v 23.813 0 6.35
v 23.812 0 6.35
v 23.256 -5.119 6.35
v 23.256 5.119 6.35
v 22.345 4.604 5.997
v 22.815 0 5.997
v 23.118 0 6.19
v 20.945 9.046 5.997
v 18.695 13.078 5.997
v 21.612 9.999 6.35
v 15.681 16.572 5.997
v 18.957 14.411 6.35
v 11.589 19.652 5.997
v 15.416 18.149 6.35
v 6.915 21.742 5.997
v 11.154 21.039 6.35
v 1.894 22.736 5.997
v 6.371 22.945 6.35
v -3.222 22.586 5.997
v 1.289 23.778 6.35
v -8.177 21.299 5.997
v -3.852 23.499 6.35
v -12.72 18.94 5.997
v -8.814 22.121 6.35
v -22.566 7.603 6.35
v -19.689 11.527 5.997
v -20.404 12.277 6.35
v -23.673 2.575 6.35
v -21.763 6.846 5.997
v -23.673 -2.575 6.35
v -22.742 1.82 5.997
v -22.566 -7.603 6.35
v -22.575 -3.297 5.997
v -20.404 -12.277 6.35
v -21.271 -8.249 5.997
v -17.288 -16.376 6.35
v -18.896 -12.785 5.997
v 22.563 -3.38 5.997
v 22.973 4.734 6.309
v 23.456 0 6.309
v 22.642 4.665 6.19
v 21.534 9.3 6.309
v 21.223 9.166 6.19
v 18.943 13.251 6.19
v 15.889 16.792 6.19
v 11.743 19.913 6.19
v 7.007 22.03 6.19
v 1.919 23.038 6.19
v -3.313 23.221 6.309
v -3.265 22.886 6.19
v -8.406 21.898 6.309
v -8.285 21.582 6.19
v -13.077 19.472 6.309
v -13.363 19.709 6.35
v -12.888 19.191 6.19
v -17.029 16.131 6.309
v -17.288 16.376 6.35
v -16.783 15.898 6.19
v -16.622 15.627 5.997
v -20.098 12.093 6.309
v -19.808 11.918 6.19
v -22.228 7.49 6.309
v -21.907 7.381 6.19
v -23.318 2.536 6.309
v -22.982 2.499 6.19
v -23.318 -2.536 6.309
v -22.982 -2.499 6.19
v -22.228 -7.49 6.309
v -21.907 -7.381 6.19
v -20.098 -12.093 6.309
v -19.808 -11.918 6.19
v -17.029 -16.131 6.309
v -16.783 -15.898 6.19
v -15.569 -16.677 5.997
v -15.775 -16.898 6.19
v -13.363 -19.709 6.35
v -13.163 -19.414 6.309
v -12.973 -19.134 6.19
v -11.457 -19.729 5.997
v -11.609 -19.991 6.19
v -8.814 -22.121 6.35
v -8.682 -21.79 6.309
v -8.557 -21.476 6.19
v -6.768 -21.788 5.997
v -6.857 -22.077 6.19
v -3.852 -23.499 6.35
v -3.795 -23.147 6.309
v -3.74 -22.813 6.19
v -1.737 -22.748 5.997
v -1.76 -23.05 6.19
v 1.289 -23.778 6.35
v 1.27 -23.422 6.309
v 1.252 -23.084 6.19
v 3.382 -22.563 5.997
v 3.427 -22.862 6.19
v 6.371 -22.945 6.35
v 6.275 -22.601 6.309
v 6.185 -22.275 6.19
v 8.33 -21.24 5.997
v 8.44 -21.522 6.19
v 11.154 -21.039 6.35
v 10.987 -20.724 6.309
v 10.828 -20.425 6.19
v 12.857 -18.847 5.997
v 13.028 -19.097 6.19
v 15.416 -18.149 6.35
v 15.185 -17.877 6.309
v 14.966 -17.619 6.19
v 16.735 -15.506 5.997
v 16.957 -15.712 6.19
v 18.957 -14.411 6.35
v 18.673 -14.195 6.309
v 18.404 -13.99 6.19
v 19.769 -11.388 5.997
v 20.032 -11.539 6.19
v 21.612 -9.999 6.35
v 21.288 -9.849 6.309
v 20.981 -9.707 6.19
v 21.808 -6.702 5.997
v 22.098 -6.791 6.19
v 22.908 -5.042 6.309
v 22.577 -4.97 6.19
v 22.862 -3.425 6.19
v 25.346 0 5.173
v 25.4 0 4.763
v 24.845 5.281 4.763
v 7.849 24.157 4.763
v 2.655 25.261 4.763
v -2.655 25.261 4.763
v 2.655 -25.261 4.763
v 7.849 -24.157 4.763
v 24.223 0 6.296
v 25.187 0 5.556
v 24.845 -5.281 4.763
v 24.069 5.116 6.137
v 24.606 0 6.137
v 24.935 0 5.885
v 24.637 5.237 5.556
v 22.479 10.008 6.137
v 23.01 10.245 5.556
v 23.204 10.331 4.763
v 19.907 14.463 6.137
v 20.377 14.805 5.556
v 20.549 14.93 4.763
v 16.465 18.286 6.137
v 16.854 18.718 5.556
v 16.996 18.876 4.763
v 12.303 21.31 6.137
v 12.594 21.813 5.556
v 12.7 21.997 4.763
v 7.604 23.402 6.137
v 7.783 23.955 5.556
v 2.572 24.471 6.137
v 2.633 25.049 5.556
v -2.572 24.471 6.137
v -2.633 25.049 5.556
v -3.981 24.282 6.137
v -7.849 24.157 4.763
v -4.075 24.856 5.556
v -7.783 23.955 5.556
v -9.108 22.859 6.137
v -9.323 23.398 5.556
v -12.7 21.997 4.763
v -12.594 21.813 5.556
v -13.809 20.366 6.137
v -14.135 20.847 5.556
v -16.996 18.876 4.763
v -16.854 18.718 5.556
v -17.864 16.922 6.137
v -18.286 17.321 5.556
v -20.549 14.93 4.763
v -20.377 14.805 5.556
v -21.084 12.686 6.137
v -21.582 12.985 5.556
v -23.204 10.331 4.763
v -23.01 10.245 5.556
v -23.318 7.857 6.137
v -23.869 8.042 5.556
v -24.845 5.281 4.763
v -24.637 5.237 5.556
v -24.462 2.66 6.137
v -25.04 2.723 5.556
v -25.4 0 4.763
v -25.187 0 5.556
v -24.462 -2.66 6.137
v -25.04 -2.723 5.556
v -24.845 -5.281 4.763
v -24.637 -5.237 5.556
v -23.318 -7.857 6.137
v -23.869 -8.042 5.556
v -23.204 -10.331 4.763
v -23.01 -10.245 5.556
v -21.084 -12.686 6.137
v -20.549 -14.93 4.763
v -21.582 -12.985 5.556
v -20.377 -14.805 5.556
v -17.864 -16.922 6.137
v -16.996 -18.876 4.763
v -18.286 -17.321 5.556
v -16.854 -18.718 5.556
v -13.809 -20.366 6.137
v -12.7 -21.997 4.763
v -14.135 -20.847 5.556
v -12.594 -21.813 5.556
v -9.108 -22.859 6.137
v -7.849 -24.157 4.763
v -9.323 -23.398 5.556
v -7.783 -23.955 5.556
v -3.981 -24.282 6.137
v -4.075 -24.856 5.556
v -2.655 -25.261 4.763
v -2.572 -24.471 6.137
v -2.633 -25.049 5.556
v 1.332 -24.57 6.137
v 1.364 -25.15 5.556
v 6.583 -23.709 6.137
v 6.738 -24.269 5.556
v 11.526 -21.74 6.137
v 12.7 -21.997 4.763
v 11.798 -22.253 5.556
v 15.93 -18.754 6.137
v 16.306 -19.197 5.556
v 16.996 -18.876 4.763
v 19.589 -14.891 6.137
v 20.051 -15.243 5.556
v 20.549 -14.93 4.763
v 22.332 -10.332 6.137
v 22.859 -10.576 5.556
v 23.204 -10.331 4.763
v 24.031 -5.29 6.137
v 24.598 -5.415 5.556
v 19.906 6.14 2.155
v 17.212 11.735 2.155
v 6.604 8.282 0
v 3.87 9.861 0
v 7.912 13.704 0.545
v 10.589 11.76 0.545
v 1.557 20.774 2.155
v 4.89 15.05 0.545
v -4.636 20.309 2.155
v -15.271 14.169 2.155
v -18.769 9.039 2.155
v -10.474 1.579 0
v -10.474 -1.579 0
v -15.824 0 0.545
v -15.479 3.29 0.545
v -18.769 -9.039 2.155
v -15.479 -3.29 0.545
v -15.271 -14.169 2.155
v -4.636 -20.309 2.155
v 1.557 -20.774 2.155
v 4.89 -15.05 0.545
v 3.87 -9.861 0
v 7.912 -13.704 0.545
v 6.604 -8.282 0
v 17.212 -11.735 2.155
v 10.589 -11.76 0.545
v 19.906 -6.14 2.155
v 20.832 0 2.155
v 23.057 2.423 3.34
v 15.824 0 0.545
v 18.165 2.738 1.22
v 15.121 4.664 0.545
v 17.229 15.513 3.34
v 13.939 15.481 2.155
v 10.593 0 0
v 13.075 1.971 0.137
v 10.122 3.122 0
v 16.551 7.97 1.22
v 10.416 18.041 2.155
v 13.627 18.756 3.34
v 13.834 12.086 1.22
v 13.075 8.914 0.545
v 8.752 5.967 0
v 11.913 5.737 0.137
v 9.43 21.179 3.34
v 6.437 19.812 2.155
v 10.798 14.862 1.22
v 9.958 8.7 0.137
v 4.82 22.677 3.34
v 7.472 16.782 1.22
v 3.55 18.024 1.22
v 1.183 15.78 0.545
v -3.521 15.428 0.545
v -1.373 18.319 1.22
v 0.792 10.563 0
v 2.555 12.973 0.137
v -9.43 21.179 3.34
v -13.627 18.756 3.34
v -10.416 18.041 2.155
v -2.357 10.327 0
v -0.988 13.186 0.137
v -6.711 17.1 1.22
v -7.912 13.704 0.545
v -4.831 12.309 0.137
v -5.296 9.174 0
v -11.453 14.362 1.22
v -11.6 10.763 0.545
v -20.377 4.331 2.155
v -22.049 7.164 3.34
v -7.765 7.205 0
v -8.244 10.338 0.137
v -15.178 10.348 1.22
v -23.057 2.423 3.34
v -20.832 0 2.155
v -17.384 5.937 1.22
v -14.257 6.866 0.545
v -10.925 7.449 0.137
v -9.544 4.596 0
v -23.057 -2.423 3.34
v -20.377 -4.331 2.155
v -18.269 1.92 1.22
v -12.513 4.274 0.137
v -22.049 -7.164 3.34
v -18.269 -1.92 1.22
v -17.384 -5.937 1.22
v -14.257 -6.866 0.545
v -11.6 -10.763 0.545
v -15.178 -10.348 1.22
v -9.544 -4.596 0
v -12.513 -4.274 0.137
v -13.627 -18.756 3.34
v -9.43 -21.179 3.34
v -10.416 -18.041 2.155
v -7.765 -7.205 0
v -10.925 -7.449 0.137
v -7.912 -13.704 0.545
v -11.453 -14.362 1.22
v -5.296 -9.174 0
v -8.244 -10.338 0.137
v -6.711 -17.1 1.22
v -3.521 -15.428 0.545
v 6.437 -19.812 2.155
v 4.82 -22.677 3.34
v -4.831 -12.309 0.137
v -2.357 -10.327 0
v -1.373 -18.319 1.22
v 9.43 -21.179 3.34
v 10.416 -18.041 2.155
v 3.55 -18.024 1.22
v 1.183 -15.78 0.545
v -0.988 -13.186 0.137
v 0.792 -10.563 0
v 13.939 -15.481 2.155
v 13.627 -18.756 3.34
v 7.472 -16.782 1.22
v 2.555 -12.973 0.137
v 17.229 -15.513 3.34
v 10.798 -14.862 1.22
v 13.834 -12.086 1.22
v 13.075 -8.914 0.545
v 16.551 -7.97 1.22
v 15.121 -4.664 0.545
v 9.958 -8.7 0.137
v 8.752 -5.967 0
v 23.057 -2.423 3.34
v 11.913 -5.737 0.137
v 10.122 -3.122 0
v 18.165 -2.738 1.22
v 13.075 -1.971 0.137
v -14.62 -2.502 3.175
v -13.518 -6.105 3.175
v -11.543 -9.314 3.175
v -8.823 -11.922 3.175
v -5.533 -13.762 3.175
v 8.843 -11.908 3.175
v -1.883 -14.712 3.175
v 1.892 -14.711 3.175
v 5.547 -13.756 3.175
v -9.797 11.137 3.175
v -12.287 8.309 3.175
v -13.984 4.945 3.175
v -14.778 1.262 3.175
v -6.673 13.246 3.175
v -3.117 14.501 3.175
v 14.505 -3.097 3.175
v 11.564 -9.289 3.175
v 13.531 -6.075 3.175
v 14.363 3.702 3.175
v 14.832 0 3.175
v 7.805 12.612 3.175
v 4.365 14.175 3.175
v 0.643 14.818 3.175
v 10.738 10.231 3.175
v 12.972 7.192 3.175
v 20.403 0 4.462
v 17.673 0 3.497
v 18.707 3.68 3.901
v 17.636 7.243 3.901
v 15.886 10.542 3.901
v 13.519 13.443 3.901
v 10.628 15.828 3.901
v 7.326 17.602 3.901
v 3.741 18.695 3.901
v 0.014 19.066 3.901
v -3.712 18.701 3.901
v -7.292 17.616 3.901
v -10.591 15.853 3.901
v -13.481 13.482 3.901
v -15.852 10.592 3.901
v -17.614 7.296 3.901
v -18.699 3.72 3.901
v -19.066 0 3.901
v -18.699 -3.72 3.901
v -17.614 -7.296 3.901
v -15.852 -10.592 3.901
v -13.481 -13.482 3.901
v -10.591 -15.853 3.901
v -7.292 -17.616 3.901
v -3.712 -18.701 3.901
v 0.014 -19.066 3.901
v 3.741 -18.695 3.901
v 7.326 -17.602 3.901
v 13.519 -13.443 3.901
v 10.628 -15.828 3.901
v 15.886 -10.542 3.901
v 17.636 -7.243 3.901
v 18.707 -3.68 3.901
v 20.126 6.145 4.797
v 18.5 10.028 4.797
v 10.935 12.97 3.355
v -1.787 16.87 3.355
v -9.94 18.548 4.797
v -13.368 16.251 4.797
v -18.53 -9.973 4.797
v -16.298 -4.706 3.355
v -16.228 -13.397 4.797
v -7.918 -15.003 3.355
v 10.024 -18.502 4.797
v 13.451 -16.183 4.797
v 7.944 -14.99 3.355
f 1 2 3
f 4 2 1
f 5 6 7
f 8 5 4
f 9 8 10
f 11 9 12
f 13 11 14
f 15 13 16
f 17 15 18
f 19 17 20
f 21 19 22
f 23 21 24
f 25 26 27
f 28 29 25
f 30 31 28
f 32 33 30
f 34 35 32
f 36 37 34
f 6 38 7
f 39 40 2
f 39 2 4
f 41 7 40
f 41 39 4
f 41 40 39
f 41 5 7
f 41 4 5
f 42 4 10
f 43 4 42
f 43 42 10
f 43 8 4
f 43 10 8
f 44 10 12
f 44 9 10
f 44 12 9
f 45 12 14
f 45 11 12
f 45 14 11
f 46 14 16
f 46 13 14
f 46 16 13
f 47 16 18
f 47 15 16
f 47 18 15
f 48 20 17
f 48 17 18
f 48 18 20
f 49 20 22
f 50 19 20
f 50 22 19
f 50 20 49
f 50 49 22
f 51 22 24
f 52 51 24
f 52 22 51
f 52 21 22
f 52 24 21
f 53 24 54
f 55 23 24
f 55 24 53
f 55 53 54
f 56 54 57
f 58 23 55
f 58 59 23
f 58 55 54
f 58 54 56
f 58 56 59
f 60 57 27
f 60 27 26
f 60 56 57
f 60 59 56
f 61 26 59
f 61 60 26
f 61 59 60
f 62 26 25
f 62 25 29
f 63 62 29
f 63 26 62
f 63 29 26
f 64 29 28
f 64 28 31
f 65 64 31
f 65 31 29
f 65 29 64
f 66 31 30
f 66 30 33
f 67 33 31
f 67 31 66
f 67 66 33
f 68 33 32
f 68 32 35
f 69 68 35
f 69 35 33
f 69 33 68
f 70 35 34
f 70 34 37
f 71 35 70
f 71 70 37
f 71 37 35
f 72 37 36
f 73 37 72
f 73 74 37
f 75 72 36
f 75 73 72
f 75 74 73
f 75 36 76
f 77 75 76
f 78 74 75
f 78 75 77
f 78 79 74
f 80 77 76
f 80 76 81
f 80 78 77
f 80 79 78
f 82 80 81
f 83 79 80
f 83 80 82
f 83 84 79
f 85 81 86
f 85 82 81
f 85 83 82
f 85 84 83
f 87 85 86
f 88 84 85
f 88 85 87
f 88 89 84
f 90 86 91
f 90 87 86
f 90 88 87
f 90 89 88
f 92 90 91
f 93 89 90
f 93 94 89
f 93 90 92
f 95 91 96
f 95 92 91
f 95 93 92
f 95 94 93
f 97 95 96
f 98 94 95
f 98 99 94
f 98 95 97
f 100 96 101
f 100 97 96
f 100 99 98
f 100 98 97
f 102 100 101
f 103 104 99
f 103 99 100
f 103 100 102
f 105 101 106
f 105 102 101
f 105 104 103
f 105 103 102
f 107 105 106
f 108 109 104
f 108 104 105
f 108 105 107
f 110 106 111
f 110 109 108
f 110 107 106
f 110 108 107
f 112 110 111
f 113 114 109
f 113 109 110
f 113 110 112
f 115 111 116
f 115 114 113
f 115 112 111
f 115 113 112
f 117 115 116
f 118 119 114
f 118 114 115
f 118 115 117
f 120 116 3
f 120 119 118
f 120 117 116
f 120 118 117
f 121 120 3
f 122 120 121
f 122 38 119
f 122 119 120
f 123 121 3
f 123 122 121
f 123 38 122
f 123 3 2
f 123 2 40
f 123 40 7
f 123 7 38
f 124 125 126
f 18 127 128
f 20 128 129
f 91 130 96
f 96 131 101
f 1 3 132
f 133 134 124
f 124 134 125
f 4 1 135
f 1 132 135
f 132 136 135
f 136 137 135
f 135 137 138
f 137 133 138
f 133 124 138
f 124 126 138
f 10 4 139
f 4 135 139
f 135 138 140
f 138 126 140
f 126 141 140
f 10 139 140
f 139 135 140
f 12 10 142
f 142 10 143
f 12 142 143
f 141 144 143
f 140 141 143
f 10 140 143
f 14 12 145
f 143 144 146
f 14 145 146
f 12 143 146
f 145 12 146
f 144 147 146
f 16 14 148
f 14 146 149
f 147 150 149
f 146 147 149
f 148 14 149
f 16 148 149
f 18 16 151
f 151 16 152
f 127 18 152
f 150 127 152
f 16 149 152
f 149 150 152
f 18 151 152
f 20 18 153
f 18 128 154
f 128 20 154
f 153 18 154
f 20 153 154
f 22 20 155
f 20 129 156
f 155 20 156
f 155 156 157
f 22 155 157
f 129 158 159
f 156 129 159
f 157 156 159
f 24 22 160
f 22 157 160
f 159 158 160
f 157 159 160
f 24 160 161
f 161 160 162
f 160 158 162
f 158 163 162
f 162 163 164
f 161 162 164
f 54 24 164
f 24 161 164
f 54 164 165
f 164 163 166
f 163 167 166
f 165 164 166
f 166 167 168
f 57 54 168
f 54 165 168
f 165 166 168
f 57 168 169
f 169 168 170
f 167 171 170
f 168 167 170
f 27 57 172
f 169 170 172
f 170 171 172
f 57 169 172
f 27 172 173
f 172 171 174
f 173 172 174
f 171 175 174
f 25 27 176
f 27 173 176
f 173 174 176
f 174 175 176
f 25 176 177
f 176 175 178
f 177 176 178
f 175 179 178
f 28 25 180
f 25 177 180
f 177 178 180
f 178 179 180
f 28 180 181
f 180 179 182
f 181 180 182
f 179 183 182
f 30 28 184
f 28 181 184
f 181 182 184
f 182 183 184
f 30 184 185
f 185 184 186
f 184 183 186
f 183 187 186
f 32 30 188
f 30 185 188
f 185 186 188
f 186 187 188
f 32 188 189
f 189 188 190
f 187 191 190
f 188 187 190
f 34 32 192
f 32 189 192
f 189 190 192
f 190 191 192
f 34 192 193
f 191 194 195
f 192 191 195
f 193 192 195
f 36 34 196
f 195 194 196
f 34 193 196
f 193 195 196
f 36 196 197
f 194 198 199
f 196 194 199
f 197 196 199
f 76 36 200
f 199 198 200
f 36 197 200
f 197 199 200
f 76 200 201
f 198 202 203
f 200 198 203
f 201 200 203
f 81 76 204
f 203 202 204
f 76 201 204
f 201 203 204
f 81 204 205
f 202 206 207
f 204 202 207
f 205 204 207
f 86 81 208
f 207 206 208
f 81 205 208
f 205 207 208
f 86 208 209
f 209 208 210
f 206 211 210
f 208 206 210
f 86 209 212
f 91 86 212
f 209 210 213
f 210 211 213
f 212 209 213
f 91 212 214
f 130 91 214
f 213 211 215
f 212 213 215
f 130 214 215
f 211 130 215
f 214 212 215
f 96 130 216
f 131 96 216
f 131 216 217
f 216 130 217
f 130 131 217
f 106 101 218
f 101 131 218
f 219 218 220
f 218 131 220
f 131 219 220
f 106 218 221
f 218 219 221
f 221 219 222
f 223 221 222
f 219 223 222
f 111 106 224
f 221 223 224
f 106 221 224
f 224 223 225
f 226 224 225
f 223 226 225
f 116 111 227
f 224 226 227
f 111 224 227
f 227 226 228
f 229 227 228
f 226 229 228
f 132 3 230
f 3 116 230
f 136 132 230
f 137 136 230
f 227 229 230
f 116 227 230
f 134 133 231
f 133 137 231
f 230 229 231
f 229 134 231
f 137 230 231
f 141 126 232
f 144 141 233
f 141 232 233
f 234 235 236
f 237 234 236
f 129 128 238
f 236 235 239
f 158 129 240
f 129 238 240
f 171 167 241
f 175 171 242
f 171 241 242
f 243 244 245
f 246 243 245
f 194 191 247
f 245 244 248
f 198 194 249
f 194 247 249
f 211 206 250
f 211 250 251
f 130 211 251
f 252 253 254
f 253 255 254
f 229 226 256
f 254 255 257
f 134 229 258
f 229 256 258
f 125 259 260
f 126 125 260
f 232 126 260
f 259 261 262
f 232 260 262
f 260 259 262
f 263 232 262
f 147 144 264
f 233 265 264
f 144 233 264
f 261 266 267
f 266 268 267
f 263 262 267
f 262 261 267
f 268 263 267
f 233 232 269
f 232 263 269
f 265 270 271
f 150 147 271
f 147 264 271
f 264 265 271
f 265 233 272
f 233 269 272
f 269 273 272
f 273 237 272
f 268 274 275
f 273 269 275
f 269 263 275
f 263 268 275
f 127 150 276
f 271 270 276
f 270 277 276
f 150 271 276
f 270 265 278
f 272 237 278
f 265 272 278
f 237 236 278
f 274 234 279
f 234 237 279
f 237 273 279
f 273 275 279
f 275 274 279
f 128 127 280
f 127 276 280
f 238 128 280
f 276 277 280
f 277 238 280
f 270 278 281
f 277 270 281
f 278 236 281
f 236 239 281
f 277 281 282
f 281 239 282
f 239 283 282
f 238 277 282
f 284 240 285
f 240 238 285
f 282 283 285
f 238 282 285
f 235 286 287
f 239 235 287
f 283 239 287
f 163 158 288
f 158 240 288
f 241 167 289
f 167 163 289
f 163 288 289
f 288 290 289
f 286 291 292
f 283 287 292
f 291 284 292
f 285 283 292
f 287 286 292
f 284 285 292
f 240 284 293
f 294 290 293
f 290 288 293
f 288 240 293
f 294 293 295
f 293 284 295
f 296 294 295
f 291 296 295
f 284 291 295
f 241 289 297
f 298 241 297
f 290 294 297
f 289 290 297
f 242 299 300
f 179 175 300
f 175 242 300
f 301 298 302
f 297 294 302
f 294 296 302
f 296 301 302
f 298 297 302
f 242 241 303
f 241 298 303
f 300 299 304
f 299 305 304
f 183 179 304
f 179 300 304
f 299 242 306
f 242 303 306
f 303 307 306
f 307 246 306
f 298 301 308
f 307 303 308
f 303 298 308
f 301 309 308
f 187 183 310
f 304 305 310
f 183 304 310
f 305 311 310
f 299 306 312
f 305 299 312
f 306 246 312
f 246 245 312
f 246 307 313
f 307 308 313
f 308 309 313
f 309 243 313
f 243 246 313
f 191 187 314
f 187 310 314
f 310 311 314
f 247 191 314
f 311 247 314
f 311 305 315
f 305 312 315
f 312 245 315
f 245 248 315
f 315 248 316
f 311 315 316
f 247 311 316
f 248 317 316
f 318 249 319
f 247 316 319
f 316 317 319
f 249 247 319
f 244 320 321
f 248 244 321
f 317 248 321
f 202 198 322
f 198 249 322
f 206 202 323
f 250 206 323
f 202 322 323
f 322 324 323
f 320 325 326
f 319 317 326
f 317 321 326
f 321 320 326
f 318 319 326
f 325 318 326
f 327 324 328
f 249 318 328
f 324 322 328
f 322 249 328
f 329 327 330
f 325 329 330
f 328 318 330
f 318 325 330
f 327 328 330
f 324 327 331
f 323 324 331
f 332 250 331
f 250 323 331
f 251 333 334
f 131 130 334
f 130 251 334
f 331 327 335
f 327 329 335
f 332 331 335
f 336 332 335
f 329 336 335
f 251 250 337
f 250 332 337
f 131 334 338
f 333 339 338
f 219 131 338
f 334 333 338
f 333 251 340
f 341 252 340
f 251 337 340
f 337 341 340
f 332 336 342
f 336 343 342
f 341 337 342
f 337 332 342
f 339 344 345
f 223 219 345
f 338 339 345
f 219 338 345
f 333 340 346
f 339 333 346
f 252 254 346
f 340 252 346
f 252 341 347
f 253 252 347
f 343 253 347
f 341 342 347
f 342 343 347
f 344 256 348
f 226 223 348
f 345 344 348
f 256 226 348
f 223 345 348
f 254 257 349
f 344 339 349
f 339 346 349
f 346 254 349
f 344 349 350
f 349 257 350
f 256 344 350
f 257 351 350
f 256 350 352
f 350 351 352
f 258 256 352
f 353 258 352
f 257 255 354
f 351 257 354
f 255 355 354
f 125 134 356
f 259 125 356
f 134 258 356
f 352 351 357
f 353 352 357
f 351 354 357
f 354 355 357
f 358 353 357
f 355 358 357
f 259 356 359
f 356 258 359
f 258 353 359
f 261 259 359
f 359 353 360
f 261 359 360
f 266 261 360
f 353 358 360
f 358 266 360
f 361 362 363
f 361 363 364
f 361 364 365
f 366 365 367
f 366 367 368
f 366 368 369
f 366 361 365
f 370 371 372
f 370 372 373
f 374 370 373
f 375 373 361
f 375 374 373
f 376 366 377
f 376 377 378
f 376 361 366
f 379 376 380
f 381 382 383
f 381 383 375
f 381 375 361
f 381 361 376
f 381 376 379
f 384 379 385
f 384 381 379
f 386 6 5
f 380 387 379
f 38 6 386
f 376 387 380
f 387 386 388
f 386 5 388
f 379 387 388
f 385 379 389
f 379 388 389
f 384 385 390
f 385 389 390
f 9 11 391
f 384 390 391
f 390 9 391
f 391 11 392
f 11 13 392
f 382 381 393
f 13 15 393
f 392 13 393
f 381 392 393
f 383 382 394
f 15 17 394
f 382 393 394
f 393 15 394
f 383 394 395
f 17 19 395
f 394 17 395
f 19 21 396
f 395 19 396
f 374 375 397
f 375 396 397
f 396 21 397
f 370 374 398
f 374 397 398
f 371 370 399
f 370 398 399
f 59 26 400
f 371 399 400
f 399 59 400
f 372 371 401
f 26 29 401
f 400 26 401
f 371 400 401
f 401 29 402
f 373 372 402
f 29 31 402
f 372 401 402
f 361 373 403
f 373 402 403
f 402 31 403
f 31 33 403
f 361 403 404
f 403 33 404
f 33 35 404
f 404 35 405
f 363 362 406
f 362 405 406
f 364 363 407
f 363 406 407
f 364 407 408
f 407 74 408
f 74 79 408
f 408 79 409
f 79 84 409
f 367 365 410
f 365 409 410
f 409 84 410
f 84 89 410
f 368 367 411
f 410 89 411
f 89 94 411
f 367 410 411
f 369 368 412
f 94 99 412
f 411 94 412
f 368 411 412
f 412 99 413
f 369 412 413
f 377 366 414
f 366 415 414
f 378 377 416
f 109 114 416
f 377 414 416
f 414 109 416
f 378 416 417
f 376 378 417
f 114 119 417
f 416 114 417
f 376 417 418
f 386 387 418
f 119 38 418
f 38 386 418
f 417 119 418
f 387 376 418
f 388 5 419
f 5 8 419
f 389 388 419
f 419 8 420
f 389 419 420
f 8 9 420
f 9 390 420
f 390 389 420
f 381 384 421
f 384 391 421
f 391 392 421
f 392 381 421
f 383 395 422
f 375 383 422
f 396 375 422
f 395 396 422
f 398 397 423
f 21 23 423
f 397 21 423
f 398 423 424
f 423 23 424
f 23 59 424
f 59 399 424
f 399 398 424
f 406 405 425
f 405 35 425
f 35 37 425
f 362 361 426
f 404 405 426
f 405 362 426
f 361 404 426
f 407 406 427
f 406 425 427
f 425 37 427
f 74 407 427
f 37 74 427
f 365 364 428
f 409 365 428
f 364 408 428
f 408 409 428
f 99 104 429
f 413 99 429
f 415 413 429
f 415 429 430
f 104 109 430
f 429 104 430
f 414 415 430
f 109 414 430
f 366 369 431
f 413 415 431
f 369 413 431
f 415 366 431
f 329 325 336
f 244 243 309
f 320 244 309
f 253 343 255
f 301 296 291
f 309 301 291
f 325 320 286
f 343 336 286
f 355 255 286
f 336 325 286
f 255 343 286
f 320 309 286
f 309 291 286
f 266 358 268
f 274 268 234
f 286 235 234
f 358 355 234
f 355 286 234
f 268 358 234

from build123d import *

# Parameters (mm, degrees)
F0_R     = 25.4
F0_R_2   = 22.225
F1_DEPTH = 6.35
F2_DEPTH = 3.175
F3_R     = 1.5875
F4_R     = 1.58749
F5_R     = 12.7


# Not quite as in the source:
# - a fillet or chamfer that OpenCascade refuses, or shapes differently, is made with other operations: its cross-section is extruded or revolved along the edge and cut away or added
# - a fillet or chamfer is up to 0.001 mm smaller than in the source, because OpenCascade refuses the exact size


with BuildPart() as f1:
    # F0 (on Top) → F1 (new body)
    with BuildSketch(Plane.XY):
        Circle(F0_R)
        Circle(F0_R_2, mode=Mode.SUBTRACT)
    extrude(amount=F1_DEPTH)

    # F0 (on Top) → F2 (join)
    with BuildSketch(Plane.XY):
        Circle(F0_R_2)
    extrude(amount=F2_DEPTH)

    # F3
    f3_edges = [f1.edges().sort_by_distance(p)[0] for p in [
        (-22.225, 0, 6.35),
    ]]
    fillet(f3_edges, radius=F3_R)

    # F4 (radius 1.5875 in the source; OpenCascade refuses exactly that, so slightly less here)
    f4_edges = [f1.edges().sort_by_distance(p)[0] for p in [
        (-25.4, 0, 6.35),
    ]]
    fillet(f4_edges, radius=F4_R)

    # F5
    f5_edges = [f1.edges().sort_by_distance(p)[0] for p in [
        (-22.225, 0, 3.175),
    ]]
    fillet(f5_edges, radius=F5_R)

    # F6: fillet of radius 25.4 on 1 edges, made by hand

    # F6_s1 → F6_t2 (revolve, cut)
    with BuildSketch(Plane.XZ):
        with BuildLine():
            ThreePointArc((25.4, 4.76251), (18.3699099141, 1.219923015), (10.5927718158, 0))
            Line((10.5927718158, 0), (10.5927718158, -0.508))
            Line((10.5927718158, -0.508), (25.4, -0.508))
            Line((25.4, -0.508), (25.908, 0))
            ThreePointArc((25.908, 0), (25.908, 2.381255), (25.6961445637, 4.3497602))
            Line((25.6961445637, 4.3497602), (25.4, 4.76251))
        make_face()
    revolve(axis=Axis((0, 0, 0), (0, 0, 1)), mode=Mode.SUBTRACT)


solid = f1.part
